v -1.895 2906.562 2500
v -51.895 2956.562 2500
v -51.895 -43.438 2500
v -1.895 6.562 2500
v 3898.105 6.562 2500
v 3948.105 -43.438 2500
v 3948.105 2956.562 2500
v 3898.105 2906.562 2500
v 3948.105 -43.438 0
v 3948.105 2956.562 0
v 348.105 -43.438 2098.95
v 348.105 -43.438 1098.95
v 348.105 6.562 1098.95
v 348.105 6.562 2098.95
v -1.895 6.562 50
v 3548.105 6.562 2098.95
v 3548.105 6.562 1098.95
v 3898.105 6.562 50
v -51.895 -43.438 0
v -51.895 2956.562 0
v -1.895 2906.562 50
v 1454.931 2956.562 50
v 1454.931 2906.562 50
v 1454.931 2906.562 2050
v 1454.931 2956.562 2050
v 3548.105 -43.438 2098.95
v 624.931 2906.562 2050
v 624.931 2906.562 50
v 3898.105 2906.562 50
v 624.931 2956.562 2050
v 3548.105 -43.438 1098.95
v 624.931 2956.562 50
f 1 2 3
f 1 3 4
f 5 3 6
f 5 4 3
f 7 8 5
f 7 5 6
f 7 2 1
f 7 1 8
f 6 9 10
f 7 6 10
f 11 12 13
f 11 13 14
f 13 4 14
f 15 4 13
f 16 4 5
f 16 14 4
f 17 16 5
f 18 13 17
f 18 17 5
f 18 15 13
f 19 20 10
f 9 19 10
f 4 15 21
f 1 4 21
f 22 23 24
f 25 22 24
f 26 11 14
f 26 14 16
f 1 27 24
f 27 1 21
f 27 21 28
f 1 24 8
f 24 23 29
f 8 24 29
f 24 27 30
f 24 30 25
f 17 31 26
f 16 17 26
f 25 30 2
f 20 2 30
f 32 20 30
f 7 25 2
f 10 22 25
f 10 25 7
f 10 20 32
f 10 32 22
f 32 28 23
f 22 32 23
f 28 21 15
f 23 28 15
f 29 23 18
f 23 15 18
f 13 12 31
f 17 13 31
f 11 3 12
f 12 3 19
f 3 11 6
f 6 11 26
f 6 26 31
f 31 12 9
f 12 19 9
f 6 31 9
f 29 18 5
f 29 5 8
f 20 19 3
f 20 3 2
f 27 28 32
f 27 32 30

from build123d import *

# Parameters (mm, degrees)
ESQUISSE1_W             = 4000
ESQUISSE1_H             = 3000
BOSS_EXTRU_1_DEPTH      = 2500
COQUE1_T                = -50
ENL_V_MAT_EXTRU_1_REACH = 3002
ESQUISSE2_W             = 3200
ESQUISSE2_H             = 1000
ENL_V_MAT_EXTRU_2_REACH = 52
ESQUISSE3_W             = 830
ESQUISSE3_H             = 2000


with BuildPart() as part:
    # Esquisse1 → Boss.-Extru.1 (new body)
    with BuildSketch(Plane.XY):
        with Locations((1948.10540889, 1456.562305219)):
            Rectangle(ESQUISSE1_W, ESQUISSE1_H)
    extrude(amount=BOSS_EXTRU_1_DEPTH)

    # Coque1
    coque1_openings = [part.faces().sort_by_distance(p)[0] for p in [
        (1948.10540889, 1456.562305219, 2500),
    ]]
    offset(amount=COQUE1_T, openings=coque1_openings, kind=Kind.INTERSECTION)

    # Esquisse2 → Enlèv. mat.-Extru.1 (cut, up to next)
    with BuildSketch(Plane.XZ.offset(43.437694781), mode=Mode.PRIVATE) as enl_v_mat_extru_1_sk1:
        with Locations((1948.10540889, 1598.950328811)):
            Rectangle(ESQUISSE2_W, ESQUISSE2_H)
    enl_v_mat_extru_1_tool1 = extrude(enl_v_mat_extru_1_sk1.sketch, amount=-ENL_V_MAT_EXTRU_1_REACH, mode=Mode.PRIVATE) & part.part
    add(enl_v_mat_extru_1_tool1.solids().sort_by_distance((1948.105409, -43.437695, 1598.950329))[0], mode=Mode.SUBTRACT)

    # Esquisse3 → Enlèv. mat.-Extru.2 (cut, up to next)
    with BuildSketch(Plane.XZ.offset(-2906.562305219), mode=Mode.PRIVATE) as enl_v_mat_extru_2_sk1:
        with Locations((1039.930637484, 1050)):
            Rectangle(ESQUISSE3_W, ESQUISSE3_H)
    enl_v_mat_extru_2_tool1 = extrude(enl_v_mat_extru_2_sk1.sketch, amount=-ENL_V_MAT_EXTRU_2_REACH, mode=Mode.PRIVATE) & part.part
    add(enl_v_mat_extru_2_tool1.solids().sort_by_distance((1039.930637, 2906.562305, 1050))[0], mode=Mode.SUBTRACT)


solid = part.part
